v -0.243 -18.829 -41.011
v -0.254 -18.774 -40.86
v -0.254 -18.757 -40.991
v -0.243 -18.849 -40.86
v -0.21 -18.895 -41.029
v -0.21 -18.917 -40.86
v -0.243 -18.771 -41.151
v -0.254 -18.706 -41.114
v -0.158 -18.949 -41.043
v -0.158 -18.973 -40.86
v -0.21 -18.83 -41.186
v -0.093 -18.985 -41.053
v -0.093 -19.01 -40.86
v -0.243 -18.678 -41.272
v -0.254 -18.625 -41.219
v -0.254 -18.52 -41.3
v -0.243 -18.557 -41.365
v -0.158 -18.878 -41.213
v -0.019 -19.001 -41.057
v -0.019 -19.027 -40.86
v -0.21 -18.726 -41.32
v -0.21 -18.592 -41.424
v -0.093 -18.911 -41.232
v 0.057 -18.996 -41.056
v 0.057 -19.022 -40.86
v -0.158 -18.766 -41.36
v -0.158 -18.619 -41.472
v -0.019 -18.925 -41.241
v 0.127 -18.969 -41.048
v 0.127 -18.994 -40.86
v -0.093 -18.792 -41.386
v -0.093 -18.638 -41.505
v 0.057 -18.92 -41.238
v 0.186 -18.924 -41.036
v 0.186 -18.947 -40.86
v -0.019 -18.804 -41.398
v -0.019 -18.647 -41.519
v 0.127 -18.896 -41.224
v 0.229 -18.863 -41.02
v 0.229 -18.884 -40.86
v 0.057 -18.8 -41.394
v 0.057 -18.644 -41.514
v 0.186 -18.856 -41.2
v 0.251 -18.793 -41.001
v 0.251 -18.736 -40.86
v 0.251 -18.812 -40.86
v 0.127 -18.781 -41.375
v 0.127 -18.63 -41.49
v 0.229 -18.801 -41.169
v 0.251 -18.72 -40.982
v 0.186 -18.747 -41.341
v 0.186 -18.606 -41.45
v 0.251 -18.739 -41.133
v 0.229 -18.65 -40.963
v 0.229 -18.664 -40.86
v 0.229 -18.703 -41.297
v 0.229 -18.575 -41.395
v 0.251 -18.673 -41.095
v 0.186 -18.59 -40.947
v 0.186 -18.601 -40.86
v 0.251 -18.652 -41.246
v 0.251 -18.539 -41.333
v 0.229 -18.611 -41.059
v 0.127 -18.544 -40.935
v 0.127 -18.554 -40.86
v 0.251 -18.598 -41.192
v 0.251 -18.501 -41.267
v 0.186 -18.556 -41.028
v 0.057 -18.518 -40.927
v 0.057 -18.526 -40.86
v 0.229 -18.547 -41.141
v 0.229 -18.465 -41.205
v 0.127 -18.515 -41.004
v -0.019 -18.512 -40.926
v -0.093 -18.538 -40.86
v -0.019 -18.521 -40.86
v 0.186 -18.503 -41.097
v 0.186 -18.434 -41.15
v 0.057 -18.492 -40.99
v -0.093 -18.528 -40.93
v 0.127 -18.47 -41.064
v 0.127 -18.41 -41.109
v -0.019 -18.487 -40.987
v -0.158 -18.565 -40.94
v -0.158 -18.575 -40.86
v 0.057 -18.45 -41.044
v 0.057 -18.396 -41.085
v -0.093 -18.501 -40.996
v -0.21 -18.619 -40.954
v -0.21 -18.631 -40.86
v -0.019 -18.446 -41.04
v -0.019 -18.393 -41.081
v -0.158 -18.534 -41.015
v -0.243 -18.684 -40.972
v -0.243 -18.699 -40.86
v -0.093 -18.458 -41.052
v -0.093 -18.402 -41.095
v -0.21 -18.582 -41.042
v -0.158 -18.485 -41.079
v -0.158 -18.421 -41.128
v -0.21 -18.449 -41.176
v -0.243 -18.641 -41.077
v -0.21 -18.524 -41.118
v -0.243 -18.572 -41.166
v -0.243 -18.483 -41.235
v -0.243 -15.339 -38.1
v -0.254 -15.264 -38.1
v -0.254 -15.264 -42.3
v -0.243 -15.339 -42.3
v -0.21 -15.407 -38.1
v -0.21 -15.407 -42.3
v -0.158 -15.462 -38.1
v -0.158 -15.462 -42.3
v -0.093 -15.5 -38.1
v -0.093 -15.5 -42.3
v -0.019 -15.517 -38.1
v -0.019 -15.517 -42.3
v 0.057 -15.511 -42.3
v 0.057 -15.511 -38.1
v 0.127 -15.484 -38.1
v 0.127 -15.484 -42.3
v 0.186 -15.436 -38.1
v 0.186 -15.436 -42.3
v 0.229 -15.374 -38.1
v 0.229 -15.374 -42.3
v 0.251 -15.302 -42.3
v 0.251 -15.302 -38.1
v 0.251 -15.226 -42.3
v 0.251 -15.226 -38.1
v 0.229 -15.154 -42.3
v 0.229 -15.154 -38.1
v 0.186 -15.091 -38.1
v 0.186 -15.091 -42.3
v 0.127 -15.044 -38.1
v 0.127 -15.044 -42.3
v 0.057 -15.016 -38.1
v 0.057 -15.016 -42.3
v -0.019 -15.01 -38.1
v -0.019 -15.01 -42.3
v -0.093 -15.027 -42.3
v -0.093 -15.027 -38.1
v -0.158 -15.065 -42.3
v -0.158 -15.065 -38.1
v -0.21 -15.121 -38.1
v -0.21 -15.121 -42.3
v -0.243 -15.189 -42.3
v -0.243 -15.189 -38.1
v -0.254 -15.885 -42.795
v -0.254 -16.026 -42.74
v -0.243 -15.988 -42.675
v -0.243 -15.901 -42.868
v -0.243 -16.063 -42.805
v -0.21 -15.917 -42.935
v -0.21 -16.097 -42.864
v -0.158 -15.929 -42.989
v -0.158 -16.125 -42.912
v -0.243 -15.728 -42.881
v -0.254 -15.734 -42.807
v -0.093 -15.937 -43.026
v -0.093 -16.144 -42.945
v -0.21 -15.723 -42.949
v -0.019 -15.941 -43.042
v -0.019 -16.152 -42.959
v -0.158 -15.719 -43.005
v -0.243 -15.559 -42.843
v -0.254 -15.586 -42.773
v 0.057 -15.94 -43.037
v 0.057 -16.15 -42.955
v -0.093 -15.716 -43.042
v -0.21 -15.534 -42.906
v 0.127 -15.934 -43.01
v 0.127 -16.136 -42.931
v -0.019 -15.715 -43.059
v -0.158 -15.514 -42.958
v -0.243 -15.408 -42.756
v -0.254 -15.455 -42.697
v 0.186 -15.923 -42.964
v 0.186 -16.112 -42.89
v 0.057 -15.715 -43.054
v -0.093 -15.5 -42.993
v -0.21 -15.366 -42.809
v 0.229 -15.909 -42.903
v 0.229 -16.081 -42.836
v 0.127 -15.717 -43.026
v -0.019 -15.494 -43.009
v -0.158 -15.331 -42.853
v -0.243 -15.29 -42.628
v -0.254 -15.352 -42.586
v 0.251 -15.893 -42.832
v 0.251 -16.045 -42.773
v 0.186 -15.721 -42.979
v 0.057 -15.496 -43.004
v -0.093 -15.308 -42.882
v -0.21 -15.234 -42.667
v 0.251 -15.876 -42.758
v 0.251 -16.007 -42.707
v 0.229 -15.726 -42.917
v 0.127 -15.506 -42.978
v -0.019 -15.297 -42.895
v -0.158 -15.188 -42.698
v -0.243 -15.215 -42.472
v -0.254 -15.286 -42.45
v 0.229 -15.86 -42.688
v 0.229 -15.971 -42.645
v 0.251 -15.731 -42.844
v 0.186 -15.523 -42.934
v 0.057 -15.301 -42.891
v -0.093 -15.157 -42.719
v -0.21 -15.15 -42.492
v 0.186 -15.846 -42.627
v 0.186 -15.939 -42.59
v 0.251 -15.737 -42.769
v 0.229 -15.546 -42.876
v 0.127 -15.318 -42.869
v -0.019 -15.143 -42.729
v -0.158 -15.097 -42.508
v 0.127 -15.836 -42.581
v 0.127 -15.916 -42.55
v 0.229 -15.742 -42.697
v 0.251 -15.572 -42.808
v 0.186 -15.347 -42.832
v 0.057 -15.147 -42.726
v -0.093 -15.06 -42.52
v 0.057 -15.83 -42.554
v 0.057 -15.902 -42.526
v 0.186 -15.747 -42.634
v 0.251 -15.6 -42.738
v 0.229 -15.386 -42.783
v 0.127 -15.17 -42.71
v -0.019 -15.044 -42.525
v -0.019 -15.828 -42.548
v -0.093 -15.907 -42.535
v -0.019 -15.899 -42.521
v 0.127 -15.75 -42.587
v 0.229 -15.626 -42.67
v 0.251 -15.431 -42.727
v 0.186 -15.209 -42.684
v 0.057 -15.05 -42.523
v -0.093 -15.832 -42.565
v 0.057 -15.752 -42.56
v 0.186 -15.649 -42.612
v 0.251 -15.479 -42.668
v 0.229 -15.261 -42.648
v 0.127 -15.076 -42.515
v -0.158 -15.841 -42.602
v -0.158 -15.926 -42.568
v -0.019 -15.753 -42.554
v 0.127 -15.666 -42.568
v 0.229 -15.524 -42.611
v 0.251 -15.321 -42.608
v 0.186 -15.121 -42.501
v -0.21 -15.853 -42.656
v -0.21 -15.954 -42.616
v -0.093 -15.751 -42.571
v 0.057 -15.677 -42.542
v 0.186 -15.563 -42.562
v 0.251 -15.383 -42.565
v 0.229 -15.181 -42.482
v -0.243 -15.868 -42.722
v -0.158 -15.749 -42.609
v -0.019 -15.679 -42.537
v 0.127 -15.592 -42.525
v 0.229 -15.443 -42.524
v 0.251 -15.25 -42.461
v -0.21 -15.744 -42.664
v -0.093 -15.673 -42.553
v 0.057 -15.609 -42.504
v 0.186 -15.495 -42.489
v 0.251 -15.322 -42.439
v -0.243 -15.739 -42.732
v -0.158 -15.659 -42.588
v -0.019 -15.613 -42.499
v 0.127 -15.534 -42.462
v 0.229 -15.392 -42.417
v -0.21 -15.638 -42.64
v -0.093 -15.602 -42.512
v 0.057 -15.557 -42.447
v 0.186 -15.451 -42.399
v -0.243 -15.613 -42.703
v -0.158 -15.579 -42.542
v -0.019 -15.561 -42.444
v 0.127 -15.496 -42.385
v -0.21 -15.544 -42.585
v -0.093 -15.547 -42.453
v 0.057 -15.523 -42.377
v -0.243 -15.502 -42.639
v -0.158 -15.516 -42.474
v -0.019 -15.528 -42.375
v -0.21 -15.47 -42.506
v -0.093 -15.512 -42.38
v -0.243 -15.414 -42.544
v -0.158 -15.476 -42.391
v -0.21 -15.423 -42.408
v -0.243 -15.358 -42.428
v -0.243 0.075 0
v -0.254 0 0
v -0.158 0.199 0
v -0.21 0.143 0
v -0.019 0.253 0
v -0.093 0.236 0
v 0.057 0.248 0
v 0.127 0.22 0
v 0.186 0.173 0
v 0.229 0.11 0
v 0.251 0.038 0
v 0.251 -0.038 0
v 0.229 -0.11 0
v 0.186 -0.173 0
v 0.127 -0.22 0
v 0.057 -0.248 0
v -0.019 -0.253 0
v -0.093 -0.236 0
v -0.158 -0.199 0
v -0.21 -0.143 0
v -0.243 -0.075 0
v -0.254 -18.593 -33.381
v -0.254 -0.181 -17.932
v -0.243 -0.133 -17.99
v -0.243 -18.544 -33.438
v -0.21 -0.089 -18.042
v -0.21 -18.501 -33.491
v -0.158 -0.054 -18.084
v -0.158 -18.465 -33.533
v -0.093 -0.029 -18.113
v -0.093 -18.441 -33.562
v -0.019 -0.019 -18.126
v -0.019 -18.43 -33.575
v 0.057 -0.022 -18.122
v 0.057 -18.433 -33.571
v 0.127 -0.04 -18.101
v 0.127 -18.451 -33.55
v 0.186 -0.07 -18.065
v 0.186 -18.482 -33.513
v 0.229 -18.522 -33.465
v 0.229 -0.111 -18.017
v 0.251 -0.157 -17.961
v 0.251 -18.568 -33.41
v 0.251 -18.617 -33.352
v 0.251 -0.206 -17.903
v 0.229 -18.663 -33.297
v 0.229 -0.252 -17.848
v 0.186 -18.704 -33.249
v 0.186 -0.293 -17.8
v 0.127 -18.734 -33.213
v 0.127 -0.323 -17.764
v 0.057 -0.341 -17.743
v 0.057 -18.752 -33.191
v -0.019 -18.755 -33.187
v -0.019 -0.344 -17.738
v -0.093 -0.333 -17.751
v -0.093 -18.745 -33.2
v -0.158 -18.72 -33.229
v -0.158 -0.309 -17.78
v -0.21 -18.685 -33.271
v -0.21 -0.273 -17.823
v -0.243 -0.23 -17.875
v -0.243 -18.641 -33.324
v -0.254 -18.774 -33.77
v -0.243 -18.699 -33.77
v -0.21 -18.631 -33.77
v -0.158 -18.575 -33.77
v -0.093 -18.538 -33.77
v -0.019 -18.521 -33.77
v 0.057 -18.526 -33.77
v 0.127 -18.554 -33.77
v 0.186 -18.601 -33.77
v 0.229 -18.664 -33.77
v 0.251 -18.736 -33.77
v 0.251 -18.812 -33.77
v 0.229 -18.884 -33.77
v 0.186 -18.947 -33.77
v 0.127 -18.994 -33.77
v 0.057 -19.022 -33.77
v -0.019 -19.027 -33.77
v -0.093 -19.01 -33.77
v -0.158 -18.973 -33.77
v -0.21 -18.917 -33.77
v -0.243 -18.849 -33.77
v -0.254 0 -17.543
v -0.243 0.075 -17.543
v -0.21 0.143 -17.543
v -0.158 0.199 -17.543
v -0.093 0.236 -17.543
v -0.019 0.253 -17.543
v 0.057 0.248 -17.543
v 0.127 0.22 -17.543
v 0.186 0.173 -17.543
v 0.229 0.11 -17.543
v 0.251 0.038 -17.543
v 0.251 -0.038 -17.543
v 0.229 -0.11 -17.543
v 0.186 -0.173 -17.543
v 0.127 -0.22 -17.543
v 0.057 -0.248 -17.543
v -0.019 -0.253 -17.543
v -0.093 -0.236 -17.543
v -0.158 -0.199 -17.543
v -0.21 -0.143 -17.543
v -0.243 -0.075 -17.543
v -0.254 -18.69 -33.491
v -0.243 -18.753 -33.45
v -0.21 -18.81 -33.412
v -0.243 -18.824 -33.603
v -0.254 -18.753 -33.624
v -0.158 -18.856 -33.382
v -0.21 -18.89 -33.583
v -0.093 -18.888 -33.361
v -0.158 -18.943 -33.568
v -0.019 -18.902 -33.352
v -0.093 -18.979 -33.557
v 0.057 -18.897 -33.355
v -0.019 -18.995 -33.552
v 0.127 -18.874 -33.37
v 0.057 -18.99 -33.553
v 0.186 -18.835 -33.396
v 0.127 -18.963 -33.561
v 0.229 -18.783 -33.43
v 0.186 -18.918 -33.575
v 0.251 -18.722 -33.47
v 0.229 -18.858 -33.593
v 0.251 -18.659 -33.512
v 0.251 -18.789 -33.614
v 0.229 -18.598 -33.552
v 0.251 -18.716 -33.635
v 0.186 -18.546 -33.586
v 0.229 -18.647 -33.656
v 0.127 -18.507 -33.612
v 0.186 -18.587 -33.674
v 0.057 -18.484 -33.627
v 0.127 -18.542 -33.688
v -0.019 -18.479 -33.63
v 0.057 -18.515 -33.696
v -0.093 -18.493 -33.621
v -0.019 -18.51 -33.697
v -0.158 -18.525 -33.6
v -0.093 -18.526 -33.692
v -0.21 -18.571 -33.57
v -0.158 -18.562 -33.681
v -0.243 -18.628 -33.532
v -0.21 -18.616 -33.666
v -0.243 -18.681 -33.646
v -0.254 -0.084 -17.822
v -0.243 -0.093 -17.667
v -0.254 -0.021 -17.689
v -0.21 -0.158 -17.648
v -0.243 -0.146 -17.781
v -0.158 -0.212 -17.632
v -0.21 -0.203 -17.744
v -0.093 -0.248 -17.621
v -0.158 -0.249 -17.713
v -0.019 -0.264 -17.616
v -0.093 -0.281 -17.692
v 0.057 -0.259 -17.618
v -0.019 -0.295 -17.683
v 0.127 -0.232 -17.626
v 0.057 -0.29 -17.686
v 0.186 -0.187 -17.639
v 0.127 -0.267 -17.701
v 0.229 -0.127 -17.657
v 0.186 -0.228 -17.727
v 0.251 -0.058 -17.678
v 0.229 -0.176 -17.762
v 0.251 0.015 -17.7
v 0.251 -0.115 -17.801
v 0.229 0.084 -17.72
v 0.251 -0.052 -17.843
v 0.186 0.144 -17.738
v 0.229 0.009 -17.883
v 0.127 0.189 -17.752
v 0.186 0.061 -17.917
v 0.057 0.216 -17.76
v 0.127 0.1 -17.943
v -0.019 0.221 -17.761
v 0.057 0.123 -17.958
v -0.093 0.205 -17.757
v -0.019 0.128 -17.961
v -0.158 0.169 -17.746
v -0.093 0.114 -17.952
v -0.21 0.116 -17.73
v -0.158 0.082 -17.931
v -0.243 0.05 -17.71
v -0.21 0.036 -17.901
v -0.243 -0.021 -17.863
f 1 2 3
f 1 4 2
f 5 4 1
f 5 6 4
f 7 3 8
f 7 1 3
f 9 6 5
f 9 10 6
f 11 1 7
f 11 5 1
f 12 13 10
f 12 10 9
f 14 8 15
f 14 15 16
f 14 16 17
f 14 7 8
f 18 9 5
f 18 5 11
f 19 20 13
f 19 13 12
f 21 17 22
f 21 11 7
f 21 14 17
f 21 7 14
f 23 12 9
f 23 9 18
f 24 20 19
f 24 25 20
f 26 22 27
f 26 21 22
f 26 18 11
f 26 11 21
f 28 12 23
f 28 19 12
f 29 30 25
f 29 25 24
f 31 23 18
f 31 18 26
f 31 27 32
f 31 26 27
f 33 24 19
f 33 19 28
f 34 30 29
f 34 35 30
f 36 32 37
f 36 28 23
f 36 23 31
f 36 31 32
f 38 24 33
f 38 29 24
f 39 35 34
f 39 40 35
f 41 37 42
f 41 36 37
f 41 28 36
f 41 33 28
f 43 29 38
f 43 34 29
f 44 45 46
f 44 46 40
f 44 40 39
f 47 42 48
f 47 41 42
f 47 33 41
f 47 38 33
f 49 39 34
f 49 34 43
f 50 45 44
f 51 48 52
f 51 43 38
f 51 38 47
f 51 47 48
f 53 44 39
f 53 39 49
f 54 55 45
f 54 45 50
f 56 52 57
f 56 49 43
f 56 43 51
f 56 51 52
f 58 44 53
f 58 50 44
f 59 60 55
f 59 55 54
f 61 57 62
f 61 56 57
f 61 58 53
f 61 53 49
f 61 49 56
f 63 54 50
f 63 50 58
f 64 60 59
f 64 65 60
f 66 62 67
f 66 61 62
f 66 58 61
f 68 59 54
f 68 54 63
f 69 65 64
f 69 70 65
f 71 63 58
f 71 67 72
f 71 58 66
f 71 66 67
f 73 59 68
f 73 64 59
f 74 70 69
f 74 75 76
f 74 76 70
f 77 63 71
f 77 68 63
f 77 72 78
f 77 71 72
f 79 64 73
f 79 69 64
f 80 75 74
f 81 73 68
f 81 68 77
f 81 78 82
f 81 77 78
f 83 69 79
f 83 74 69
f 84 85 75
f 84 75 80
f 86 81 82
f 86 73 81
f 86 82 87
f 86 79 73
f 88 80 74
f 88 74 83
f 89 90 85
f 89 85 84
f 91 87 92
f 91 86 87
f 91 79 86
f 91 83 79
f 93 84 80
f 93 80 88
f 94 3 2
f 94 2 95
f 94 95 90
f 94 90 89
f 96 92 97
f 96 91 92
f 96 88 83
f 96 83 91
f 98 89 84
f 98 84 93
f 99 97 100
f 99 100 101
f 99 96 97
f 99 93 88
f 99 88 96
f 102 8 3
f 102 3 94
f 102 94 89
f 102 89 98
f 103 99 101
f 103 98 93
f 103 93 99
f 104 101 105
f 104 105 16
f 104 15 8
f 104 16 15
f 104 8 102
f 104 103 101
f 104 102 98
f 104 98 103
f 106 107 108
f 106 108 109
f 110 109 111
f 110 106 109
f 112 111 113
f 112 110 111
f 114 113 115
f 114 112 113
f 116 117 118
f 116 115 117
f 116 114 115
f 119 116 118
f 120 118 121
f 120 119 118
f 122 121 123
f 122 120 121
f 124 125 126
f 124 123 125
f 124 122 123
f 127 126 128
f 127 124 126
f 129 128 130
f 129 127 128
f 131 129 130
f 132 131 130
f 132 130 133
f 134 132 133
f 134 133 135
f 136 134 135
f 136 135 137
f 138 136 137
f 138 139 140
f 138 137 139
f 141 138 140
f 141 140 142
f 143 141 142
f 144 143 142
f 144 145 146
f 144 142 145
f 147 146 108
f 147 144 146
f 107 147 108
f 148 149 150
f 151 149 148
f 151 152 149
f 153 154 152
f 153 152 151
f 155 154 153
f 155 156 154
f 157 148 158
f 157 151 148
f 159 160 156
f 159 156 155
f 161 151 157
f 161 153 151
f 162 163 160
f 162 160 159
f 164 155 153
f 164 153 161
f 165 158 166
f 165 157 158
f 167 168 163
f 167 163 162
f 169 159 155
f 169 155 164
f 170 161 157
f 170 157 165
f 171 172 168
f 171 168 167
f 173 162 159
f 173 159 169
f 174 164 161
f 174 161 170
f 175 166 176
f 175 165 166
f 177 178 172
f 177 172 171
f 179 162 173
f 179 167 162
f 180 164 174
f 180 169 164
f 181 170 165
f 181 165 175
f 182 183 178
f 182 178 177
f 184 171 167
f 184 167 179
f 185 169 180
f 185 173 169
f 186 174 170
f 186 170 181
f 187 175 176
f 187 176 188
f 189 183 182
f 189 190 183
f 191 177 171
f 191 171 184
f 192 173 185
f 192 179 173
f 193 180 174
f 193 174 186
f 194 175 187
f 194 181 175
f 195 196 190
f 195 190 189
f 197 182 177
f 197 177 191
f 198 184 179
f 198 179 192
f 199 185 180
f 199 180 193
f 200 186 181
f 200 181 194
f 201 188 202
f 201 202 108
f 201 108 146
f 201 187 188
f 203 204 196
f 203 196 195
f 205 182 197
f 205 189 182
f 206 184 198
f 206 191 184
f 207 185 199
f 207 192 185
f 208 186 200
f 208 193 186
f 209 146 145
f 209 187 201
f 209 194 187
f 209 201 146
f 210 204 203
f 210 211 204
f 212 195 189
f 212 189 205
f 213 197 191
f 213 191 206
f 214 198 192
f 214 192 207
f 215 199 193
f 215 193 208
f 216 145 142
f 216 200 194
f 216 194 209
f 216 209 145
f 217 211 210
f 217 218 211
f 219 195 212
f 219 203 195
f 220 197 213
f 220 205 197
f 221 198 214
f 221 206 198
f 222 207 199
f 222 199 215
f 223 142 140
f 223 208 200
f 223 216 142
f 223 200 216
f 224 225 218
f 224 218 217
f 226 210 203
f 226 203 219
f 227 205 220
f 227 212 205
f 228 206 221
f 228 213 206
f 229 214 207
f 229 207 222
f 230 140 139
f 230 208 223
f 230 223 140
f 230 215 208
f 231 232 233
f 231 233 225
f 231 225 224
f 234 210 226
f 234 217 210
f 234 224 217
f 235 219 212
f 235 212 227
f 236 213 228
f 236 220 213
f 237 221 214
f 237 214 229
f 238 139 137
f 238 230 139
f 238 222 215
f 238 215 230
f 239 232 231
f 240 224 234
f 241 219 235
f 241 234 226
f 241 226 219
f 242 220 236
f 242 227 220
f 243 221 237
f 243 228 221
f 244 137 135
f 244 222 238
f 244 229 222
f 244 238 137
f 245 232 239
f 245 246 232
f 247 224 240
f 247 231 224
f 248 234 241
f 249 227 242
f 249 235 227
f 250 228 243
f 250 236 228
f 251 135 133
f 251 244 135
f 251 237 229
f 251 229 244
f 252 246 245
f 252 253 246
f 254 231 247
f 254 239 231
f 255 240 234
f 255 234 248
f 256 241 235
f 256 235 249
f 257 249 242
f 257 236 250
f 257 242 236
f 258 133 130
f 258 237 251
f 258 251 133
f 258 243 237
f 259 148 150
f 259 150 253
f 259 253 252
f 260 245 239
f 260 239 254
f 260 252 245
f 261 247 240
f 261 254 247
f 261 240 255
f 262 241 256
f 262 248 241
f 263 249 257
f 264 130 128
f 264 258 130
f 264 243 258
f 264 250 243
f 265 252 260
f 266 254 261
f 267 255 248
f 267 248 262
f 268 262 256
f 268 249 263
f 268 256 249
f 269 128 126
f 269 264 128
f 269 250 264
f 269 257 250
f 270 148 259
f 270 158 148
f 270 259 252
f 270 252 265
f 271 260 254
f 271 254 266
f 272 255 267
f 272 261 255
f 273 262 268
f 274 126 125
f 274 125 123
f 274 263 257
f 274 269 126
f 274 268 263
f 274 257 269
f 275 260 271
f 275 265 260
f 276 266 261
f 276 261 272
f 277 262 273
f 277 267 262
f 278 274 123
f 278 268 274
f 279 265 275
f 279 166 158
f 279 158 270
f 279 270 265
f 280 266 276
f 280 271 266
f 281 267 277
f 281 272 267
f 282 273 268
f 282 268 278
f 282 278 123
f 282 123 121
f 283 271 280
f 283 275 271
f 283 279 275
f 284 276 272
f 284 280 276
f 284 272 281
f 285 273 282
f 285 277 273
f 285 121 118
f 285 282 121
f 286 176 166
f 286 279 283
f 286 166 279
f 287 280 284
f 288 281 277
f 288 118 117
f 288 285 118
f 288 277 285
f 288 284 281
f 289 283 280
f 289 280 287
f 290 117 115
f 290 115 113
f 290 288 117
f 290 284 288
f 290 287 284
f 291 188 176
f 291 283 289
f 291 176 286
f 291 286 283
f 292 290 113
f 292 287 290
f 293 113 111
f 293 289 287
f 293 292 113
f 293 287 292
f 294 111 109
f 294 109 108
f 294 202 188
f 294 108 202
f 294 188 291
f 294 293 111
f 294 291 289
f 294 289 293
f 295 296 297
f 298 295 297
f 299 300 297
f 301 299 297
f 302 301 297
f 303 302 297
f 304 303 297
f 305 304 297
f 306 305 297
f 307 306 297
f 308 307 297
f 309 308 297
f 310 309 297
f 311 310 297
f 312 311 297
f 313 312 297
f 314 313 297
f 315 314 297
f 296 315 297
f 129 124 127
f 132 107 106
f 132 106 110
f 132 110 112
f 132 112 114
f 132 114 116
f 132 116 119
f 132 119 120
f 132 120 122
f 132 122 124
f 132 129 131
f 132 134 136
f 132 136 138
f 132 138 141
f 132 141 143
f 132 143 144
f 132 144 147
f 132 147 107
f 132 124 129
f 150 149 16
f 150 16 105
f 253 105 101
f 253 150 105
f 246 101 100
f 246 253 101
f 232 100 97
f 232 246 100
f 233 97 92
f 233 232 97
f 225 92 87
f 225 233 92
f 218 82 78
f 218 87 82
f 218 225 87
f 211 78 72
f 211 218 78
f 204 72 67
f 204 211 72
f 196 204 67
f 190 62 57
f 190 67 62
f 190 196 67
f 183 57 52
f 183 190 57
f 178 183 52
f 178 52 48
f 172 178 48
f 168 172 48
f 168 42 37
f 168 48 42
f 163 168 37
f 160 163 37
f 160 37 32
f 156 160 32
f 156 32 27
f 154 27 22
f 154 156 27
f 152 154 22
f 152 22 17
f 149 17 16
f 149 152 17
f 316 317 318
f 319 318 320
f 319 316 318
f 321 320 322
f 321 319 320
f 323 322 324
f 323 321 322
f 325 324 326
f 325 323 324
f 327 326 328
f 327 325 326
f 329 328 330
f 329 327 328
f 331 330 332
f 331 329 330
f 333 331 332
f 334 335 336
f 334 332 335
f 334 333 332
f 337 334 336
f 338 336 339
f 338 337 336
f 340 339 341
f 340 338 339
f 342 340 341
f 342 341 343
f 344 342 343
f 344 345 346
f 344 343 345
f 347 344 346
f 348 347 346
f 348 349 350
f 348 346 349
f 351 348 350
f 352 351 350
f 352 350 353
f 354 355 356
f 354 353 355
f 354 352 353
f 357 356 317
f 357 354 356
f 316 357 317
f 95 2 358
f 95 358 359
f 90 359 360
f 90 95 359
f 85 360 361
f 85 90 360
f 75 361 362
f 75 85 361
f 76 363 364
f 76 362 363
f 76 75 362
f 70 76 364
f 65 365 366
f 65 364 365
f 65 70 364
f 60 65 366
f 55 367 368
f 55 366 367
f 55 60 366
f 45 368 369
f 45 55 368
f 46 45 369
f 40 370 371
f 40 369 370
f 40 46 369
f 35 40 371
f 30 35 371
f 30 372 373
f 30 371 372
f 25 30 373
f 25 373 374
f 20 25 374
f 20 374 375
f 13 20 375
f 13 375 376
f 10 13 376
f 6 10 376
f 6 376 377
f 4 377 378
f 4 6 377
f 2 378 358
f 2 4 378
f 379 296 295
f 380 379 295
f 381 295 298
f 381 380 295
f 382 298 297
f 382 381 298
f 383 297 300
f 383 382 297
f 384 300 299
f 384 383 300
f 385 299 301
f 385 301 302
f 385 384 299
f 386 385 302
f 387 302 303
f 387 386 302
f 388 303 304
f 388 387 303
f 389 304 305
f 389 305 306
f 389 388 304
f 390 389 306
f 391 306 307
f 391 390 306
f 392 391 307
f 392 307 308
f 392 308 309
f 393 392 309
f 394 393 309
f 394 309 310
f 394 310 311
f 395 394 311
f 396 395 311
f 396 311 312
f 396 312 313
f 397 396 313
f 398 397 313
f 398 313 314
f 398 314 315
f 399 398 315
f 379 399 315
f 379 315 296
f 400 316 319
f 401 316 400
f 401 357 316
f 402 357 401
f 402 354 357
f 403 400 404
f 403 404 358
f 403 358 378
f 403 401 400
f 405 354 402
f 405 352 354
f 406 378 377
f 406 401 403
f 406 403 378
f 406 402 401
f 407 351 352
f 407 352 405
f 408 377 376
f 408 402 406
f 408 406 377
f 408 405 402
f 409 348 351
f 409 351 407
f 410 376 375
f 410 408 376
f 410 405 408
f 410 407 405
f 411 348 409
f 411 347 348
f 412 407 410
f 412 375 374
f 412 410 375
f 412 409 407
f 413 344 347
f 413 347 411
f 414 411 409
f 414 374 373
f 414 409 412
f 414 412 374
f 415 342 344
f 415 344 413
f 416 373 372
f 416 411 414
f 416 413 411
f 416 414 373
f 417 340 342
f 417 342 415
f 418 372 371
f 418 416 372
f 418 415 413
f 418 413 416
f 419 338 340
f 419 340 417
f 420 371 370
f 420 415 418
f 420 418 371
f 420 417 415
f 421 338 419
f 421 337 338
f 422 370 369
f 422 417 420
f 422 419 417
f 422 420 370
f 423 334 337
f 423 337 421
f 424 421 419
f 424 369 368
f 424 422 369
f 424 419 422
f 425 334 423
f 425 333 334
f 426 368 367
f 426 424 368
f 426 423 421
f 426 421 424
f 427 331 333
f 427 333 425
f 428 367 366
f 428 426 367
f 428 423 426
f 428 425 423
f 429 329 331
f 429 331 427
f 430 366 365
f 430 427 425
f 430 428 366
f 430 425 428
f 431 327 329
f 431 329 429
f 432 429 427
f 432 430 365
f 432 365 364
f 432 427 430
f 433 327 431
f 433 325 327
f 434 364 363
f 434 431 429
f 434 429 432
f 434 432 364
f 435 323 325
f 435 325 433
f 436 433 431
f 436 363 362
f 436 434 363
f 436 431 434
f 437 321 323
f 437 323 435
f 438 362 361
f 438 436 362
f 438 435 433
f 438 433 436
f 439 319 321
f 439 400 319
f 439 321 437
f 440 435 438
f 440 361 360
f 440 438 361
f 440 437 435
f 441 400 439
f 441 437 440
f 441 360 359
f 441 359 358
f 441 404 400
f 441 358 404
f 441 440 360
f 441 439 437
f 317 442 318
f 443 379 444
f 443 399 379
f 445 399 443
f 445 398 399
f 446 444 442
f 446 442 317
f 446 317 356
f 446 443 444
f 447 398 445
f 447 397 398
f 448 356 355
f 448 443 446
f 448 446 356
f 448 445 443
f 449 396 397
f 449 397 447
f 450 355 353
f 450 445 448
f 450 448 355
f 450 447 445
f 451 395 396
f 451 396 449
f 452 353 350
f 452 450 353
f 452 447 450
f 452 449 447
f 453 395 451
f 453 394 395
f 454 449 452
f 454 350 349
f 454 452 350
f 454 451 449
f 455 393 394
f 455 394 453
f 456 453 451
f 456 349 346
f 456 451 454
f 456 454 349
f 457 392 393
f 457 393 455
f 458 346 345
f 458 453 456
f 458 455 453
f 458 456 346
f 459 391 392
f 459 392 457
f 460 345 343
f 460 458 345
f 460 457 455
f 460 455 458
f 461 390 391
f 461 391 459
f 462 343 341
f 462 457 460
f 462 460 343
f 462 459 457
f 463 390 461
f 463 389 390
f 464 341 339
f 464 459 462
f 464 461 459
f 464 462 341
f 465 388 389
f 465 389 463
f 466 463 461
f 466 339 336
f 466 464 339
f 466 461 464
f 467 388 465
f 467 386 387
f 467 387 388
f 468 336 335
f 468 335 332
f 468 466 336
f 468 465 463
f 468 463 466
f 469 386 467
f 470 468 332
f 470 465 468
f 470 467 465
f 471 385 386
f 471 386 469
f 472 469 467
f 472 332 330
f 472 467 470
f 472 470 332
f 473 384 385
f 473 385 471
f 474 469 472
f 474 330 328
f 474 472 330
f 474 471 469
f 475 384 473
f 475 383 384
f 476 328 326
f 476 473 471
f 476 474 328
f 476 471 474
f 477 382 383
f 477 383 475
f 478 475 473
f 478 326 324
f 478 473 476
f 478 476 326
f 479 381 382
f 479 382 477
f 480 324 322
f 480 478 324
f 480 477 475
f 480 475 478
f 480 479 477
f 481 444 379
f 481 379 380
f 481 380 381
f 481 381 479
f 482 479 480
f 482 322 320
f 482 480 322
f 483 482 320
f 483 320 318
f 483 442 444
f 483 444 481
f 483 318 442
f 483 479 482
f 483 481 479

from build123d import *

# Parameters (mm, degrees)
SWEEP1_PROFILE_R = 0.254


with BuildPart() as part:
    # Sweep1: sweep along a path in Sketch1
    with BuildLine(Plane(origin=(0, 0, 0), x_dir=(0, 0, -1), z_dir=(1, 0, 0))) as sweep1_path:
        Line((0, 0), (17.54311571, 0))
        ThreePointArc((17.54311571, 0), (17.757805787, -0.047595644), (17.932266287, -0.181463894))
        Line((17.932266287, -0.181463894), (33.38103842, -18.592593586))
        ThreePointArc((33.38103842, -18.592593586), (33.55549892, -18.726461836), (33.770188997, -18.77405748))
        Line((33.770188997, -18.77405748), (40.86001077, -18.77405748))
        ThreePointArc((40.86001077, -18.77405748), (41.11401077, -18.705998385), (41.299951675, -18.52005748))
        Line((41.299951675, -18.52005748), (42.740059095, -16.025718261))
        ThreePointArc((42.740059095, -16.025718261), (42.740059095, -15.517718261), (42.30011819, -15.263718261))
        Line((42.30011819, -15.263718261), (38.1, -15.263718261))
    # Sweep1 profile (on start of the path) → Sweep1 (sweep)
    with BuildSketch(Plane(origin=(0, 0, 0), x_dir=(-1, 0, 0), z_dir=(0, 0, -1))):
        Circle(SWEEP1_PROFILE_R)
    sweep(path=sweep1_path.line)


solid = part.part
